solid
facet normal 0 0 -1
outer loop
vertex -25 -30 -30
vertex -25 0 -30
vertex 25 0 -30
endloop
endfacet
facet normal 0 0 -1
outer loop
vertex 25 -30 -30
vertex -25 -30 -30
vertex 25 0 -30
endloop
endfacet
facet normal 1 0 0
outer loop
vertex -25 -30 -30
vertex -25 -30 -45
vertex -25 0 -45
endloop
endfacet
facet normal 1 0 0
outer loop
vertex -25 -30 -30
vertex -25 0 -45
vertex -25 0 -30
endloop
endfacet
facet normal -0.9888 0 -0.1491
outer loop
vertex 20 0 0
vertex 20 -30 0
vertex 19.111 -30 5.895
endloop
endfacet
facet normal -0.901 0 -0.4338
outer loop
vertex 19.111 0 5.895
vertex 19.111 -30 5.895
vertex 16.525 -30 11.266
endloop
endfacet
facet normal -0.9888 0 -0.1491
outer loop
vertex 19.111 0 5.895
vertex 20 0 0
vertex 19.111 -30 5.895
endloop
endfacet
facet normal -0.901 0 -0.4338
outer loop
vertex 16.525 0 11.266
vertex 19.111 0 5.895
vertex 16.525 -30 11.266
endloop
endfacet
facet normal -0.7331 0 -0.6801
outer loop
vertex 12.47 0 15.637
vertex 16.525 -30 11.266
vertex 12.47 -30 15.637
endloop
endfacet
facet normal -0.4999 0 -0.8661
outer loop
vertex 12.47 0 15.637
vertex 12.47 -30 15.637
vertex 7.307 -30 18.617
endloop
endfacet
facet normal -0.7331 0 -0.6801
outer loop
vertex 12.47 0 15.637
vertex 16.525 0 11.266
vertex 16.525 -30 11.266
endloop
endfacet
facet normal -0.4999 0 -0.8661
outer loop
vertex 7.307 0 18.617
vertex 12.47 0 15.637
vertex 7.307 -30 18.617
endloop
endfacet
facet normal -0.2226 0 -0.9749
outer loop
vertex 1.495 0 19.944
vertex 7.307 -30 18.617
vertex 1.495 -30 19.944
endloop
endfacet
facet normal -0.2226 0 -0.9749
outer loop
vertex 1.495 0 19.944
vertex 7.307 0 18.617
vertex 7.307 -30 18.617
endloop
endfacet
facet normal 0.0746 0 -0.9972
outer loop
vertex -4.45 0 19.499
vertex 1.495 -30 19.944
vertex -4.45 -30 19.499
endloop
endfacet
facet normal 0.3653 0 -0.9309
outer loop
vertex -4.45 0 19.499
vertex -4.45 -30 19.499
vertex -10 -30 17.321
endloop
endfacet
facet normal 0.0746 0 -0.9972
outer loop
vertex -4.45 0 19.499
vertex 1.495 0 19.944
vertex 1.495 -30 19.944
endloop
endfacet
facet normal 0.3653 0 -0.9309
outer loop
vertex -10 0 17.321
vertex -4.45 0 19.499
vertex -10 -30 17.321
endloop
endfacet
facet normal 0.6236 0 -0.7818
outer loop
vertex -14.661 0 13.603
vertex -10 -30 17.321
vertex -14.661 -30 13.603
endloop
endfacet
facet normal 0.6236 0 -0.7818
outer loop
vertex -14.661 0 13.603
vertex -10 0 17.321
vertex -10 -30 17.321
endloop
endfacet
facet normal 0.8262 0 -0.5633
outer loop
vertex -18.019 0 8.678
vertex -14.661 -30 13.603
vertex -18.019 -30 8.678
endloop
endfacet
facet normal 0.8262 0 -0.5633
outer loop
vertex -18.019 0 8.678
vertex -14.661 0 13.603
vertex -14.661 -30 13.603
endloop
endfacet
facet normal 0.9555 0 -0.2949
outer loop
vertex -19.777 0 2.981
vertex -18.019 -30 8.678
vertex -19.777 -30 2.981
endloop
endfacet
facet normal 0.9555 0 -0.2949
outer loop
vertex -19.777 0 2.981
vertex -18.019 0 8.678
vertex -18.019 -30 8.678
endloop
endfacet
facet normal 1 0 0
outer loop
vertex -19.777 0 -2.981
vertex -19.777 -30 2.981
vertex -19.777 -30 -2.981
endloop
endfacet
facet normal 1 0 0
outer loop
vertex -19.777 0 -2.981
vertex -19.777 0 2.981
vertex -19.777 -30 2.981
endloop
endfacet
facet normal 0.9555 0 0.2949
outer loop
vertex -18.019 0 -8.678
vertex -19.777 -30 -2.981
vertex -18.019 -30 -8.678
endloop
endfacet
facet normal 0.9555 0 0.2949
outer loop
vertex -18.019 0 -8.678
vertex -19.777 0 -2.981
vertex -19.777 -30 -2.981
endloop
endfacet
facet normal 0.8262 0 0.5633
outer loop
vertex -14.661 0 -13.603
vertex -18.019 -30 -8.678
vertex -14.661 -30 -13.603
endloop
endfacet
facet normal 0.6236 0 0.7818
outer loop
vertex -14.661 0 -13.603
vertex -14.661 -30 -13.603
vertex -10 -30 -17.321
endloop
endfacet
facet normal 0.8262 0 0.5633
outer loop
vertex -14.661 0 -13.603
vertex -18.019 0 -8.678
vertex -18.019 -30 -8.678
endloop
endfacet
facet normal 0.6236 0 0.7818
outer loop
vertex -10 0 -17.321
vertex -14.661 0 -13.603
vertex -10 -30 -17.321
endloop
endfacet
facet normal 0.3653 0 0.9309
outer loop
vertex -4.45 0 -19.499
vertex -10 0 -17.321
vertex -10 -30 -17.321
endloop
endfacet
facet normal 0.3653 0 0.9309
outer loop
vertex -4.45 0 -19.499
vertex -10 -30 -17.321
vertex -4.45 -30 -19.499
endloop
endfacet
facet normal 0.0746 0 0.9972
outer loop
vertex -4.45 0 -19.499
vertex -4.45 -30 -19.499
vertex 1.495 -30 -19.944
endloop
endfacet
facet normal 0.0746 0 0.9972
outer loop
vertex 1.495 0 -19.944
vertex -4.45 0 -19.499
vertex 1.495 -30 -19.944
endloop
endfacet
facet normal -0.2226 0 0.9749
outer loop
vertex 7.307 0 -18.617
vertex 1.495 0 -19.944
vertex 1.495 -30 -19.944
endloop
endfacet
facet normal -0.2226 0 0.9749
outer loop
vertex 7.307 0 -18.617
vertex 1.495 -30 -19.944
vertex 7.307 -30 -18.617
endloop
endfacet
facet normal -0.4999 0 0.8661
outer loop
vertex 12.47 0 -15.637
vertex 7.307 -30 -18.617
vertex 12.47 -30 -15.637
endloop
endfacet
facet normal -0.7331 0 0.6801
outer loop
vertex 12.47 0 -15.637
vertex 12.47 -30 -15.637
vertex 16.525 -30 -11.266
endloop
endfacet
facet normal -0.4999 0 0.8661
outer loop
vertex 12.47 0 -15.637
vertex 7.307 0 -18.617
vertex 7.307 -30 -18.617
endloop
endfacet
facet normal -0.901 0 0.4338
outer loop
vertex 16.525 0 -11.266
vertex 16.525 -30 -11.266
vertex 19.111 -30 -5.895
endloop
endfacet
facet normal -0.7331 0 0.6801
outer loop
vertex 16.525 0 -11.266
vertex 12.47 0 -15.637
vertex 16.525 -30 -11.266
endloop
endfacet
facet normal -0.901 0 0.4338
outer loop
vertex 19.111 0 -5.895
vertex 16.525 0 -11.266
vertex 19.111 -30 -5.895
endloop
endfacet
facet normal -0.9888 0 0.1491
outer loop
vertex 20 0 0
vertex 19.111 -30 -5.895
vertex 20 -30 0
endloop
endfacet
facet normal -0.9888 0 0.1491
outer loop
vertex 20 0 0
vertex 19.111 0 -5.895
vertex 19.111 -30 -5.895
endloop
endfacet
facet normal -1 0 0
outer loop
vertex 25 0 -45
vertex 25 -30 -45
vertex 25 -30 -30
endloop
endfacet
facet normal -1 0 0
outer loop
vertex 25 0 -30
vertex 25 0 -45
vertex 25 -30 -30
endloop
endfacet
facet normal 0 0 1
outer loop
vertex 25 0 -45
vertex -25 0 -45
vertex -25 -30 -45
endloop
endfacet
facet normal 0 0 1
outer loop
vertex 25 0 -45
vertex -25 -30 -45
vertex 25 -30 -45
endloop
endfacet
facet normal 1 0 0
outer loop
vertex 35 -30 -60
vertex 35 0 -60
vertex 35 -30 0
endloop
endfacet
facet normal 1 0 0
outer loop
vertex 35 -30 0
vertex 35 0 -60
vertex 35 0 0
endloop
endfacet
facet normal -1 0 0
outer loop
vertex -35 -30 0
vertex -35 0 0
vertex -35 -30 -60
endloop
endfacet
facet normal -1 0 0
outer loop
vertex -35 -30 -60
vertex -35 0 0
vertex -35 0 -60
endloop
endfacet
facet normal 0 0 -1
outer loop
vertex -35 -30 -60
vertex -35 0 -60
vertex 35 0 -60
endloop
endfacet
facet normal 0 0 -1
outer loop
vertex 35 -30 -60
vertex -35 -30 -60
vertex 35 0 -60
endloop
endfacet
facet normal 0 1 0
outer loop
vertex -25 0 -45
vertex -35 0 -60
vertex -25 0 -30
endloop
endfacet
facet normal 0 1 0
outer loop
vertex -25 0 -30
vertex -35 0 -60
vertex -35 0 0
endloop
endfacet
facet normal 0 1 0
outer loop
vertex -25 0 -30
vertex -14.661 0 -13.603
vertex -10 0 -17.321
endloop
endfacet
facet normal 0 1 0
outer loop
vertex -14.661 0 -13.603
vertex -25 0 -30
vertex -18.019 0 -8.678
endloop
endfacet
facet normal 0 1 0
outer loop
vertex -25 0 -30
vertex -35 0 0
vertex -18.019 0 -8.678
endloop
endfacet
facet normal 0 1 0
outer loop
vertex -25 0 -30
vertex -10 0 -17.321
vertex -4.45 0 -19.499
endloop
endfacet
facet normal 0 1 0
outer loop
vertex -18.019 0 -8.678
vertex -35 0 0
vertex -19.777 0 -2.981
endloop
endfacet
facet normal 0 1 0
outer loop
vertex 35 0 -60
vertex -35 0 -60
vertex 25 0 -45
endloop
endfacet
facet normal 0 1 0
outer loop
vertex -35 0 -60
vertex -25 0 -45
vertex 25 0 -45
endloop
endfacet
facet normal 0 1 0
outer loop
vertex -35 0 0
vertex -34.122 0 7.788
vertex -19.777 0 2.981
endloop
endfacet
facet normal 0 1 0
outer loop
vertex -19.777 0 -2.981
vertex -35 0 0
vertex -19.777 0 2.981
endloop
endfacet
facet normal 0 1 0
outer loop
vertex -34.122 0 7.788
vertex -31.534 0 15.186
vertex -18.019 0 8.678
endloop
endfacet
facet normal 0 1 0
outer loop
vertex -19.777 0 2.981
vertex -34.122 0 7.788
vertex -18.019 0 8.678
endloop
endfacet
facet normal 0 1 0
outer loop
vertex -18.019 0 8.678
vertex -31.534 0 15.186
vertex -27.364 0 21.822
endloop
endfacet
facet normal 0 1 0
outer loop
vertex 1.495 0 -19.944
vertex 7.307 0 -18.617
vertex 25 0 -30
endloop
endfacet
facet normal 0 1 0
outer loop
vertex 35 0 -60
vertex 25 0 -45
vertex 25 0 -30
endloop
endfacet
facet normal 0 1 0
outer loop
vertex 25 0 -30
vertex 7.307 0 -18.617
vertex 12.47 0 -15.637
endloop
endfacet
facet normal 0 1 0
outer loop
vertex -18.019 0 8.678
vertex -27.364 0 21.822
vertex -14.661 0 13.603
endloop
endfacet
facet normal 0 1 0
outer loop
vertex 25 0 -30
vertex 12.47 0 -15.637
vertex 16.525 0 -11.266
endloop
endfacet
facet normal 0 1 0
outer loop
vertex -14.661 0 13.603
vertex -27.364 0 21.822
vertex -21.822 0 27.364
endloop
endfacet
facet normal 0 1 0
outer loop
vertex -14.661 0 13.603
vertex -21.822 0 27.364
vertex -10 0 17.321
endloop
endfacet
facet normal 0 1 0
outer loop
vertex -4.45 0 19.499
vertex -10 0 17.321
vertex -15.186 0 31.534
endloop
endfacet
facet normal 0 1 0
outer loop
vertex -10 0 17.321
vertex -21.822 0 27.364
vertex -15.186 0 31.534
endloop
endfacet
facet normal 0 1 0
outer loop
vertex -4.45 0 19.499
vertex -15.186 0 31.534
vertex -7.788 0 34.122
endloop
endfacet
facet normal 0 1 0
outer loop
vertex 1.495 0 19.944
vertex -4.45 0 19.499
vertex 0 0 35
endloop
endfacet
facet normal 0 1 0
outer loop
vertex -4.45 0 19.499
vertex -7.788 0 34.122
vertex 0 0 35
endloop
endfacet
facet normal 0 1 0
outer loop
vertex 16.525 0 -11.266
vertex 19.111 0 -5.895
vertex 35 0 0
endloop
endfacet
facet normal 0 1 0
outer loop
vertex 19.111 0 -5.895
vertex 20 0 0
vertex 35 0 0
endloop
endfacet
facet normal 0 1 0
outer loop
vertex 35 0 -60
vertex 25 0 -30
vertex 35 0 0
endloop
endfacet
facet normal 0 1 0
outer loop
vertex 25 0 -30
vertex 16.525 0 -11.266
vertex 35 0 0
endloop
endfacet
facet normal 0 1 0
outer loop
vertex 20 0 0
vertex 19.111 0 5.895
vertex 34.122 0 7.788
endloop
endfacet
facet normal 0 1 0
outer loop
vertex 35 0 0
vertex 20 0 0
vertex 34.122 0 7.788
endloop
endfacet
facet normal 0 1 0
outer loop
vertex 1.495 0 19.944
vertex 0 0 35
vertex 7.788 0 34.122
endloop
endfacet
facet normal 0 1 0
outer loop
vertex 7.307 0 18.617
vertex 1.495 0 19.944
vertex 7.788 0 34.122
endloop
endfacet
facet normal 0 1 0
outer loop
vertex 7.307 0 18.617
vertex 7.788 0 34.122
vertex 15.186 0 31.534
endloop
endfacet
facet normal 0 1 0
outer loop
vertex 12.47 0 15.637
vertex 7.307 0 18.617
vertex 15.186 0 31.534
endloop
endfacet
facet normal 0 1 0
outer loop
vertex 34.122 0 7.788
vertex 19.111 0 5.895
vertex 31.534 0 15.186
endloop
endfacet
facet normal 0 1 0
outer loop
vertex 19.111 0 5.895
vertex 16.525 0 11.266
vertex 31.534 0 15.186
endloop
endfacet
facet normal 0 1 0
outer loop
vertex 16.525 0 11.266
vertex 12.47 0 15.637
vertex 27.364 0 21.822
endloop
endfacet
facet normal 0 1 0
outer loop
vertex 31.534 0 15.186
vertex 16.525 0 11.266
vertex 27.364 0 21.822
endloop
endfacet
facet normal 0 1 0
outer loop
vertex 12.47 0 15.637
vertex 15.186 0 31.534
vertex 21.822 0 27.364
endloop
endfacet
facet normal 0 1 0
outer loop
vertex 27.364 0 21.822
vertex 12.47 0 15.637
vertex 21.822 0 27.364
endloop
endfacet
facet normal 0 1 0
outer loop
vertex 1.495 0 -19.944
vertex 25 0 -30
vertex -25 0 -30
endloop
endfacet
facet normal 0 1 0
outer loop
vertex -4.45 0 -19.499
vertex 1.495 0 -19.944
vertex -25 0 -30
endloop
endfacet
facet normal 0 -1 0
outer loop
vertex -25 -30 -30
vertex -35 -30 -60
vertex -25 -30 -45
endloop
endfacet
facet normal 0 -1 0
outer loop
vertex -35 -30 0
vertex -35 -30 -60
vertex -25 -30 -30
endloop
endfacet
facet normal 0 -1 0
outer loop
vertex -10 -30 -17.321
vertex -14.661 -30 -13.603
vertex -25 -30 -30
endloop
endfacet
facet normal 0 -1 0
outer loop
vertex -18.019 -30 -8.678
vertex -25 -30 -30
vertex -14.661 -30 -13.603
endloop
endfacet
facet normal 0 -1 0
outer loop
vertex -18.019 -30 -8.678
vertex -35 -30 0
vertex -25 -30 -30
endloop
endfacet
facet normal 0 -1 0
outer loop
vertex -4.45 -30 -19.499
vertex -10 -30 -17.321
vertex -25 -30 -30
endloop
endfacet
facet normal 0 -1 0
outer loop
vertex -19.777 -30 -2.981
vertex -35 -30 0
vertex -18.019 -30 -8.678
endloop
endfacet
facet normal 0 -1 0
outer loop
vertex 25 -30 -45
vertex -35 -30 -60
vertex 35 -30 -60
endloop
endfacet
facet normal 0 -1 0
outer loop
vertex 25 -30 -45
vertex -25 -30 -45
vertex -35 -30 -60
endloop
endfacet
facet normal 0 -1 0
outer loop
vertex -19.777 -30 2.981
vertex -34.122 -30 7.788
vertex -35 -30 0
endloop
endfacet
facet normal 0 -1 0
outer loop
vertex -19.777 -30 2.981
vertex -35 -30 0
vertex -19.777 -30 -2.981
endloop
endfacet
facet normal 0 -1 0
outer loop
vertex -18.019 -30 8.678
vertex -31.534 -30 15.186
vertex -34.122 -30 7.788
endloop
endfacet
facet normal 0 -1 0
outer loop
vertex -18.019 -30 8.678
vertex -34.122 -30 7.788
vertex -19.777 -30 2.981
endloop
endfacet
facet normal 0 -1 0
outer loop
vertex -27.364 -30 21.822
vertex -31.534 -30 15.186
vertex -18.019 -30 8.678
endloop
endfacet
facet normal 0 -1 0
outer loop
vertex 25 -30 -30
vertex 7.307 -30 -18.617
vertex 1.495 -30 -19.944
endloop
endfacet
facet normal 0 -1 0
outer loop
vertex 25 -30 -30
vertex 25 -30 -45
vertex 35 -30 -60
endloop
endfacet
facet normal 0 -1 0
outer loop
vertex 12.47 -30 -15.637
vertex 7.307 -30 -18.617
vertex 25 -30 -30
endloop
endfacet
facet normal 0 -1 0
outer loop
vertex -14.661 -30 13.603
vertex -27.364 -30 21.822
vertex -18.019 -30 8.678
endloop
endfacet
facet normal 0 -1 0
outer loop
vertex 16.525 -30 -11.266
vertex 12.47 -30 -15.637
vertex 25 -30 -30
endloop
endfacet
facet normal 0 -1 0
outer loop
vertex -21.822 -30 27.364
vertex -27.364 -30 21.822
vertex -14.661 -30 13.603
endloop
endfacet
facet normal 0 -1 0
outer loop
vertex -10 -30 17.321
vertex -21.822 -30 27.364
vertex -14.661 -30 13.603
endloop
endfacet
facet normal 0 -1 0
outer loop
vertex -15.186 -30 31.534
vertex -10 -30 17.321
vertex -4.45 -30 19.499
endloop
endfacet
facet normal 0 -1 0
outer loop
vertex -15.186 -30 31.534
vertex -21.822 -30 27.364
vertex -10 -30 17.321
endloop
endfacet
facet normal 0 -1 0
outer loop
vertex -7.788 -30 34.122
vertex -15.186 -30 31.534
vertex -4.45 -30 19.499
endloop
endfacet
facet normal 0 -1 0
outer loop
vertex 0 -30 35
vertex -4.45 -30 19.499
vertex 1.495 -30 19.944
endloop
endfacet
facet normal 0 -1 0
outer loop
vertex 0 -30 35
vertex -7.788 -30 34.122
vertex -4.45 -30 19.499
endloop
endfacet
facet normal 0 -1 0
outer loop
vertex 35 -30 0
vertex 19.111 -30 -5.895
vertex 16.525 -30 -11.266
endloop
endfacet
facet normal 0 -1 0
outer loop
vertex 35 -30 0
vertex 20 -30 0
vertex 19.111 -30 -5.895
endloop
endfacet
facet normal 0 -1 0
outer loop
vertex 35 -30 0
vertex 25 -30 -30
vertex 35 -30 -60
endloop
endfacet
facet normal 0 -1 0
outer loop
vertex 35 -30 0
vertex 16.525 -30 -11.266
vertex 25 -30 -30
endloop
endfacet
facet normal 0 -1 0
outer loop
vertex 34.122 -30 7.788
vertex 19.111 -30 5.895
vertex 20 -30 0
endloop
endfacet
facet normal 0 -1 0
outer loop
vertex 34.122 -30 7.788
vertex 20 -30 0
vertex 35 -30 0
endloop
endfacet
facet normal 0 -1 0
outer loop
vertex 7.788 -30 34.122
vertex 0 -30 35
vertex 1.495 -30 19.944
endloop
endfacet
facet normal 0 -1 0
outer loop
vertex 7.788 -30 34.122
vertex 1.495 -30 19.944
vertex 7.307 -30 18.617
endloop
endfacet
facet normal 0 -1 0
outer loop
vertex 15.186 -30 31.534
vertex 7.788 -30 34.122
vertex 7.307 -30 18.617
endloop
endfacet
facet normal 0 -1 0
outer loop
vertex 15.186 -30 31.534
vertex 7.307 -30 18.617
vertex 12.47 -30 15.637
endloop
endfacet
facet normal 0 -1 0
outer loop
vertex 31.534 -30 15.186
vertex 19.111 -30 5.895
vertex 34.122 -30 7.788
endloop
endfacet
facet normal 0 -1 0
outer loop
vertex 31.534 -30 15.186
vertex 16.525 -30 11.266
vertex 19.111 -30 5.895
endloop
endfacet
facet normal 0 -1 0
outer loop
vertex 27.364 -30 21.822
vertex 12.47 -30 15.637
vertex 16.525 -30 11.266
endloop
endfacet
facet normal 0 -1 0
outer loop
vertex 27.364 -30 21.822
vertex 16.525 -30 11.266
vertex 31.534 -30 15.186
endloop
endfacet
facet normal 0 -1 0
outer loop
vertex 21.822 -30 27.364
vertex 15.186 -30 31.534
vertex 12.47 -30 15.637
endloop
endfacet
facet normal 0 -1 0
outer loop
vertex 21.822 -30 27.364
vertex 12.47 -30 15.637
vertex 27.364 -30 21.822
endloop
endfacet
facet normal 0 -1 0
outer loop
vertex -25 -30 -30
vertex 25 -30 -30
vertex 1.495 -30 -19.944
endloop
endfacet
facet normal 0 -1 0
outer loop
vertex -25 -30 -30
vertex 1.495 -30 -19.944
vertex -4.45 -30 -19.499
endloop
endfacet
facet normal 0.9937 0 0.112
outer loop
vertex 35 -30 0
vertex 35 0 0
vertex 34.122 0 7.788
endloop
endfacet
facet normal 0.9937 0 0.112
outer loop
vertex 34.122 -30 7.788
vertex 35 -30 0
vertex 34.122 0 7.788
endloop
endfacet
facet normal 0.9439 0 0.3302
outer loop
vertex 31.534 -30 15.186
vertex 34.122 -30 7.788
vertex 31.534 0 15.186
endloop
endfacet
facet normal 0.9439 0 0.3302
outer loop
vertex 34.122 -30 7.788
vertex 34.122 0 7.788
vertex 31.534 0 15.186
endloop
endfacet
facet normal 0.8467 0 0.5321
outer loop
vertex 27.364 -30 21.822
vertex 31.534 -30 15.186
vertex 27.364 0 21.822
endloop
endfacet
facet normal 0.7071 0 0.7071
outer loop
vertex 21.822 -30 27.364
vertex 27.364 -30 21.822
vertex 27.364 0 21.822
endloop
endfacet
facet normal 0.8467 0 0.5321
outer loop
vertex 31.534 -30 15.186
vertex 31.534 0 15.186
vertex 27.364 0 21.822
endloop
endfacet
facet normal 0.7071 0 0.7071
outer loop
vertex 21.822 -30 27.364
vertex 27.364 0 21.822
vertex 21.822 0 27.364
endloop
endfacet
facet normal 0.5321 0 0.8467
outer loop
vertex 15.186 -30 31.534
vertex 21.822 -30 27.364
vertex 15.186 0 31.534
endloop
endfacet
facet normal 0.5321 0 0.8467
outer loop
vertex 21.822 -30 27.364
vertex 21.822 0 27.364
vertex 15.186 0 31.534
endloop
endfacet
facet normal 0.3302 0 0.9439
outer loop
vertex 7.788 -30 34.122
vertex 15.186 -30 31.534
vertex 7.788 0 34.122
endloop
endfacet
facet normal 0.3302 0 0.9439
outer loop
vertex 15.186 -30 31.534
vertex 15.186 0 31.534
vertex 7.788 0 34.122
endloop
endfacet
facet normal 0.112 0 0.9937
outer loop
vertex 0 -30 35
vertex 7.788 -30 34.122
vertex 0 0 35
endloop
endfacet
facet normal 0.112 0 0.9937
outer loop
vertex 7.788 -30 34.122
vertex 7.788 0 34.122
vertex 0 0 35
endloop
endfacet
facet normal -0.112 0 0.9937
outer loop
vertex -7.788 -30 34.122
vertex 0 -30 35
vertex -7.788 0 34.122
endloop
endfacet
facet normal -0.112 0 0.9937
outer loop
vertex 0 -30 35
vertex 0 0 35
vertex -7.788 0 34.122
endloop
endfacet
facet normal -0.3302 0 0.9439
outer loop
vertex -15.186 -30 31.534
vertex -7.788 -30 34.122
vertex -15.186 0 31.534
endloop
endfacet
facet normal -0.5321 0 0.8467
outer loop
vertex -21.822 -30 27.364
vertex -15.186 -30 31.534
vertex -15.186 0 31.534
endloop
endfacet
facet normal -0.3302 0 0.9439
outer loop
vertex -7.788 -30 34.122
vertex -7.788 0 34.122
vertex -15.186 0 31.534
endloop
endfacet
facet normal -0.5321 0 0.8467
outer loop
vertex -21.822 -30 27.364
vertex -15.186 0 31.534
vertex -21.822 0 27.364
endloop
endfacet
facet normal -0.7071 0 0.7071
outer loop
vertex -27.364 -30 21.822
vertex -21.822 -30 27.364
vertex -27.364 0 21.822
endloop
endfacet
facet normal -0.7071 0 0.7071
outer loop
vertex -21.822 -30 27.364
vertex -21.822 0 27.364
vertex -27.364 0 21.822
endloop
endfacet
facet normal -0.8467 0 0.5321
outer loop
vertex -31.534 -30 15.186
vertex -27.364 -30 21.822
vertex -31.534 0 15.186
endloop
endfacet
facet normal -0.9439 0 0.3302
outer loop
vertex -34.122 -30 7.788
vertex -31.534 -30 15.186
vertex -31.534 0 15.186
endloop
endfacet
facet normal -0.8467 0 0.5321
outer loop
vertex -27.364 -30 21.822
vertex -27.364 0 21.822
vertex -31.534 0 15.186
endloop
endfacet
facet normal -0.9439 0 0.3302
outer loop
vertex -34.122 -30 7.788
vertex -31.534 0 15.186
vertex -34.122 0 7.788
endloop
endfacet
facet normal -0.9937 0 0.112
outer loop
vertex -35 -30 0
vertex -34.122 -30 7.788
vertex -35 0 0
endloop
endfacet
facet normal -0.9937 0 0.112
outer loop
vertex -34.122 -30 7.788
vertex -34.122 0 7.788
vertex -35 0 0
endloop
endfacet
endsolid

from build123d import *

# Parameters (mm, degrees)
F0_W     = 50
F0_H     = 15
F0_R     = 20
F1_DEPTH = 30


with BuildPart() as f1:
    # F0 (on Front) → F1 (new body)
    with BuildSketch(Plane.XZ):
        with BuildLine():
            Line((35, -60), (35, 0))
            ThreePointArc((35, 0), (0, 35), (-35, 0))
            Line((-35, 0), (-35, -60))
            Line((-35, -60), (35, -60))
        make_face()
        with Locations((0, -37.5)):
            Rectangle(F0_W, F0_H, mode=Mode.SUBTRACT)
        Circle(F0_R, mode=Mode.SUBTRACT)
    extrude(amount=F1_DEPTH)


solid = f1.part
